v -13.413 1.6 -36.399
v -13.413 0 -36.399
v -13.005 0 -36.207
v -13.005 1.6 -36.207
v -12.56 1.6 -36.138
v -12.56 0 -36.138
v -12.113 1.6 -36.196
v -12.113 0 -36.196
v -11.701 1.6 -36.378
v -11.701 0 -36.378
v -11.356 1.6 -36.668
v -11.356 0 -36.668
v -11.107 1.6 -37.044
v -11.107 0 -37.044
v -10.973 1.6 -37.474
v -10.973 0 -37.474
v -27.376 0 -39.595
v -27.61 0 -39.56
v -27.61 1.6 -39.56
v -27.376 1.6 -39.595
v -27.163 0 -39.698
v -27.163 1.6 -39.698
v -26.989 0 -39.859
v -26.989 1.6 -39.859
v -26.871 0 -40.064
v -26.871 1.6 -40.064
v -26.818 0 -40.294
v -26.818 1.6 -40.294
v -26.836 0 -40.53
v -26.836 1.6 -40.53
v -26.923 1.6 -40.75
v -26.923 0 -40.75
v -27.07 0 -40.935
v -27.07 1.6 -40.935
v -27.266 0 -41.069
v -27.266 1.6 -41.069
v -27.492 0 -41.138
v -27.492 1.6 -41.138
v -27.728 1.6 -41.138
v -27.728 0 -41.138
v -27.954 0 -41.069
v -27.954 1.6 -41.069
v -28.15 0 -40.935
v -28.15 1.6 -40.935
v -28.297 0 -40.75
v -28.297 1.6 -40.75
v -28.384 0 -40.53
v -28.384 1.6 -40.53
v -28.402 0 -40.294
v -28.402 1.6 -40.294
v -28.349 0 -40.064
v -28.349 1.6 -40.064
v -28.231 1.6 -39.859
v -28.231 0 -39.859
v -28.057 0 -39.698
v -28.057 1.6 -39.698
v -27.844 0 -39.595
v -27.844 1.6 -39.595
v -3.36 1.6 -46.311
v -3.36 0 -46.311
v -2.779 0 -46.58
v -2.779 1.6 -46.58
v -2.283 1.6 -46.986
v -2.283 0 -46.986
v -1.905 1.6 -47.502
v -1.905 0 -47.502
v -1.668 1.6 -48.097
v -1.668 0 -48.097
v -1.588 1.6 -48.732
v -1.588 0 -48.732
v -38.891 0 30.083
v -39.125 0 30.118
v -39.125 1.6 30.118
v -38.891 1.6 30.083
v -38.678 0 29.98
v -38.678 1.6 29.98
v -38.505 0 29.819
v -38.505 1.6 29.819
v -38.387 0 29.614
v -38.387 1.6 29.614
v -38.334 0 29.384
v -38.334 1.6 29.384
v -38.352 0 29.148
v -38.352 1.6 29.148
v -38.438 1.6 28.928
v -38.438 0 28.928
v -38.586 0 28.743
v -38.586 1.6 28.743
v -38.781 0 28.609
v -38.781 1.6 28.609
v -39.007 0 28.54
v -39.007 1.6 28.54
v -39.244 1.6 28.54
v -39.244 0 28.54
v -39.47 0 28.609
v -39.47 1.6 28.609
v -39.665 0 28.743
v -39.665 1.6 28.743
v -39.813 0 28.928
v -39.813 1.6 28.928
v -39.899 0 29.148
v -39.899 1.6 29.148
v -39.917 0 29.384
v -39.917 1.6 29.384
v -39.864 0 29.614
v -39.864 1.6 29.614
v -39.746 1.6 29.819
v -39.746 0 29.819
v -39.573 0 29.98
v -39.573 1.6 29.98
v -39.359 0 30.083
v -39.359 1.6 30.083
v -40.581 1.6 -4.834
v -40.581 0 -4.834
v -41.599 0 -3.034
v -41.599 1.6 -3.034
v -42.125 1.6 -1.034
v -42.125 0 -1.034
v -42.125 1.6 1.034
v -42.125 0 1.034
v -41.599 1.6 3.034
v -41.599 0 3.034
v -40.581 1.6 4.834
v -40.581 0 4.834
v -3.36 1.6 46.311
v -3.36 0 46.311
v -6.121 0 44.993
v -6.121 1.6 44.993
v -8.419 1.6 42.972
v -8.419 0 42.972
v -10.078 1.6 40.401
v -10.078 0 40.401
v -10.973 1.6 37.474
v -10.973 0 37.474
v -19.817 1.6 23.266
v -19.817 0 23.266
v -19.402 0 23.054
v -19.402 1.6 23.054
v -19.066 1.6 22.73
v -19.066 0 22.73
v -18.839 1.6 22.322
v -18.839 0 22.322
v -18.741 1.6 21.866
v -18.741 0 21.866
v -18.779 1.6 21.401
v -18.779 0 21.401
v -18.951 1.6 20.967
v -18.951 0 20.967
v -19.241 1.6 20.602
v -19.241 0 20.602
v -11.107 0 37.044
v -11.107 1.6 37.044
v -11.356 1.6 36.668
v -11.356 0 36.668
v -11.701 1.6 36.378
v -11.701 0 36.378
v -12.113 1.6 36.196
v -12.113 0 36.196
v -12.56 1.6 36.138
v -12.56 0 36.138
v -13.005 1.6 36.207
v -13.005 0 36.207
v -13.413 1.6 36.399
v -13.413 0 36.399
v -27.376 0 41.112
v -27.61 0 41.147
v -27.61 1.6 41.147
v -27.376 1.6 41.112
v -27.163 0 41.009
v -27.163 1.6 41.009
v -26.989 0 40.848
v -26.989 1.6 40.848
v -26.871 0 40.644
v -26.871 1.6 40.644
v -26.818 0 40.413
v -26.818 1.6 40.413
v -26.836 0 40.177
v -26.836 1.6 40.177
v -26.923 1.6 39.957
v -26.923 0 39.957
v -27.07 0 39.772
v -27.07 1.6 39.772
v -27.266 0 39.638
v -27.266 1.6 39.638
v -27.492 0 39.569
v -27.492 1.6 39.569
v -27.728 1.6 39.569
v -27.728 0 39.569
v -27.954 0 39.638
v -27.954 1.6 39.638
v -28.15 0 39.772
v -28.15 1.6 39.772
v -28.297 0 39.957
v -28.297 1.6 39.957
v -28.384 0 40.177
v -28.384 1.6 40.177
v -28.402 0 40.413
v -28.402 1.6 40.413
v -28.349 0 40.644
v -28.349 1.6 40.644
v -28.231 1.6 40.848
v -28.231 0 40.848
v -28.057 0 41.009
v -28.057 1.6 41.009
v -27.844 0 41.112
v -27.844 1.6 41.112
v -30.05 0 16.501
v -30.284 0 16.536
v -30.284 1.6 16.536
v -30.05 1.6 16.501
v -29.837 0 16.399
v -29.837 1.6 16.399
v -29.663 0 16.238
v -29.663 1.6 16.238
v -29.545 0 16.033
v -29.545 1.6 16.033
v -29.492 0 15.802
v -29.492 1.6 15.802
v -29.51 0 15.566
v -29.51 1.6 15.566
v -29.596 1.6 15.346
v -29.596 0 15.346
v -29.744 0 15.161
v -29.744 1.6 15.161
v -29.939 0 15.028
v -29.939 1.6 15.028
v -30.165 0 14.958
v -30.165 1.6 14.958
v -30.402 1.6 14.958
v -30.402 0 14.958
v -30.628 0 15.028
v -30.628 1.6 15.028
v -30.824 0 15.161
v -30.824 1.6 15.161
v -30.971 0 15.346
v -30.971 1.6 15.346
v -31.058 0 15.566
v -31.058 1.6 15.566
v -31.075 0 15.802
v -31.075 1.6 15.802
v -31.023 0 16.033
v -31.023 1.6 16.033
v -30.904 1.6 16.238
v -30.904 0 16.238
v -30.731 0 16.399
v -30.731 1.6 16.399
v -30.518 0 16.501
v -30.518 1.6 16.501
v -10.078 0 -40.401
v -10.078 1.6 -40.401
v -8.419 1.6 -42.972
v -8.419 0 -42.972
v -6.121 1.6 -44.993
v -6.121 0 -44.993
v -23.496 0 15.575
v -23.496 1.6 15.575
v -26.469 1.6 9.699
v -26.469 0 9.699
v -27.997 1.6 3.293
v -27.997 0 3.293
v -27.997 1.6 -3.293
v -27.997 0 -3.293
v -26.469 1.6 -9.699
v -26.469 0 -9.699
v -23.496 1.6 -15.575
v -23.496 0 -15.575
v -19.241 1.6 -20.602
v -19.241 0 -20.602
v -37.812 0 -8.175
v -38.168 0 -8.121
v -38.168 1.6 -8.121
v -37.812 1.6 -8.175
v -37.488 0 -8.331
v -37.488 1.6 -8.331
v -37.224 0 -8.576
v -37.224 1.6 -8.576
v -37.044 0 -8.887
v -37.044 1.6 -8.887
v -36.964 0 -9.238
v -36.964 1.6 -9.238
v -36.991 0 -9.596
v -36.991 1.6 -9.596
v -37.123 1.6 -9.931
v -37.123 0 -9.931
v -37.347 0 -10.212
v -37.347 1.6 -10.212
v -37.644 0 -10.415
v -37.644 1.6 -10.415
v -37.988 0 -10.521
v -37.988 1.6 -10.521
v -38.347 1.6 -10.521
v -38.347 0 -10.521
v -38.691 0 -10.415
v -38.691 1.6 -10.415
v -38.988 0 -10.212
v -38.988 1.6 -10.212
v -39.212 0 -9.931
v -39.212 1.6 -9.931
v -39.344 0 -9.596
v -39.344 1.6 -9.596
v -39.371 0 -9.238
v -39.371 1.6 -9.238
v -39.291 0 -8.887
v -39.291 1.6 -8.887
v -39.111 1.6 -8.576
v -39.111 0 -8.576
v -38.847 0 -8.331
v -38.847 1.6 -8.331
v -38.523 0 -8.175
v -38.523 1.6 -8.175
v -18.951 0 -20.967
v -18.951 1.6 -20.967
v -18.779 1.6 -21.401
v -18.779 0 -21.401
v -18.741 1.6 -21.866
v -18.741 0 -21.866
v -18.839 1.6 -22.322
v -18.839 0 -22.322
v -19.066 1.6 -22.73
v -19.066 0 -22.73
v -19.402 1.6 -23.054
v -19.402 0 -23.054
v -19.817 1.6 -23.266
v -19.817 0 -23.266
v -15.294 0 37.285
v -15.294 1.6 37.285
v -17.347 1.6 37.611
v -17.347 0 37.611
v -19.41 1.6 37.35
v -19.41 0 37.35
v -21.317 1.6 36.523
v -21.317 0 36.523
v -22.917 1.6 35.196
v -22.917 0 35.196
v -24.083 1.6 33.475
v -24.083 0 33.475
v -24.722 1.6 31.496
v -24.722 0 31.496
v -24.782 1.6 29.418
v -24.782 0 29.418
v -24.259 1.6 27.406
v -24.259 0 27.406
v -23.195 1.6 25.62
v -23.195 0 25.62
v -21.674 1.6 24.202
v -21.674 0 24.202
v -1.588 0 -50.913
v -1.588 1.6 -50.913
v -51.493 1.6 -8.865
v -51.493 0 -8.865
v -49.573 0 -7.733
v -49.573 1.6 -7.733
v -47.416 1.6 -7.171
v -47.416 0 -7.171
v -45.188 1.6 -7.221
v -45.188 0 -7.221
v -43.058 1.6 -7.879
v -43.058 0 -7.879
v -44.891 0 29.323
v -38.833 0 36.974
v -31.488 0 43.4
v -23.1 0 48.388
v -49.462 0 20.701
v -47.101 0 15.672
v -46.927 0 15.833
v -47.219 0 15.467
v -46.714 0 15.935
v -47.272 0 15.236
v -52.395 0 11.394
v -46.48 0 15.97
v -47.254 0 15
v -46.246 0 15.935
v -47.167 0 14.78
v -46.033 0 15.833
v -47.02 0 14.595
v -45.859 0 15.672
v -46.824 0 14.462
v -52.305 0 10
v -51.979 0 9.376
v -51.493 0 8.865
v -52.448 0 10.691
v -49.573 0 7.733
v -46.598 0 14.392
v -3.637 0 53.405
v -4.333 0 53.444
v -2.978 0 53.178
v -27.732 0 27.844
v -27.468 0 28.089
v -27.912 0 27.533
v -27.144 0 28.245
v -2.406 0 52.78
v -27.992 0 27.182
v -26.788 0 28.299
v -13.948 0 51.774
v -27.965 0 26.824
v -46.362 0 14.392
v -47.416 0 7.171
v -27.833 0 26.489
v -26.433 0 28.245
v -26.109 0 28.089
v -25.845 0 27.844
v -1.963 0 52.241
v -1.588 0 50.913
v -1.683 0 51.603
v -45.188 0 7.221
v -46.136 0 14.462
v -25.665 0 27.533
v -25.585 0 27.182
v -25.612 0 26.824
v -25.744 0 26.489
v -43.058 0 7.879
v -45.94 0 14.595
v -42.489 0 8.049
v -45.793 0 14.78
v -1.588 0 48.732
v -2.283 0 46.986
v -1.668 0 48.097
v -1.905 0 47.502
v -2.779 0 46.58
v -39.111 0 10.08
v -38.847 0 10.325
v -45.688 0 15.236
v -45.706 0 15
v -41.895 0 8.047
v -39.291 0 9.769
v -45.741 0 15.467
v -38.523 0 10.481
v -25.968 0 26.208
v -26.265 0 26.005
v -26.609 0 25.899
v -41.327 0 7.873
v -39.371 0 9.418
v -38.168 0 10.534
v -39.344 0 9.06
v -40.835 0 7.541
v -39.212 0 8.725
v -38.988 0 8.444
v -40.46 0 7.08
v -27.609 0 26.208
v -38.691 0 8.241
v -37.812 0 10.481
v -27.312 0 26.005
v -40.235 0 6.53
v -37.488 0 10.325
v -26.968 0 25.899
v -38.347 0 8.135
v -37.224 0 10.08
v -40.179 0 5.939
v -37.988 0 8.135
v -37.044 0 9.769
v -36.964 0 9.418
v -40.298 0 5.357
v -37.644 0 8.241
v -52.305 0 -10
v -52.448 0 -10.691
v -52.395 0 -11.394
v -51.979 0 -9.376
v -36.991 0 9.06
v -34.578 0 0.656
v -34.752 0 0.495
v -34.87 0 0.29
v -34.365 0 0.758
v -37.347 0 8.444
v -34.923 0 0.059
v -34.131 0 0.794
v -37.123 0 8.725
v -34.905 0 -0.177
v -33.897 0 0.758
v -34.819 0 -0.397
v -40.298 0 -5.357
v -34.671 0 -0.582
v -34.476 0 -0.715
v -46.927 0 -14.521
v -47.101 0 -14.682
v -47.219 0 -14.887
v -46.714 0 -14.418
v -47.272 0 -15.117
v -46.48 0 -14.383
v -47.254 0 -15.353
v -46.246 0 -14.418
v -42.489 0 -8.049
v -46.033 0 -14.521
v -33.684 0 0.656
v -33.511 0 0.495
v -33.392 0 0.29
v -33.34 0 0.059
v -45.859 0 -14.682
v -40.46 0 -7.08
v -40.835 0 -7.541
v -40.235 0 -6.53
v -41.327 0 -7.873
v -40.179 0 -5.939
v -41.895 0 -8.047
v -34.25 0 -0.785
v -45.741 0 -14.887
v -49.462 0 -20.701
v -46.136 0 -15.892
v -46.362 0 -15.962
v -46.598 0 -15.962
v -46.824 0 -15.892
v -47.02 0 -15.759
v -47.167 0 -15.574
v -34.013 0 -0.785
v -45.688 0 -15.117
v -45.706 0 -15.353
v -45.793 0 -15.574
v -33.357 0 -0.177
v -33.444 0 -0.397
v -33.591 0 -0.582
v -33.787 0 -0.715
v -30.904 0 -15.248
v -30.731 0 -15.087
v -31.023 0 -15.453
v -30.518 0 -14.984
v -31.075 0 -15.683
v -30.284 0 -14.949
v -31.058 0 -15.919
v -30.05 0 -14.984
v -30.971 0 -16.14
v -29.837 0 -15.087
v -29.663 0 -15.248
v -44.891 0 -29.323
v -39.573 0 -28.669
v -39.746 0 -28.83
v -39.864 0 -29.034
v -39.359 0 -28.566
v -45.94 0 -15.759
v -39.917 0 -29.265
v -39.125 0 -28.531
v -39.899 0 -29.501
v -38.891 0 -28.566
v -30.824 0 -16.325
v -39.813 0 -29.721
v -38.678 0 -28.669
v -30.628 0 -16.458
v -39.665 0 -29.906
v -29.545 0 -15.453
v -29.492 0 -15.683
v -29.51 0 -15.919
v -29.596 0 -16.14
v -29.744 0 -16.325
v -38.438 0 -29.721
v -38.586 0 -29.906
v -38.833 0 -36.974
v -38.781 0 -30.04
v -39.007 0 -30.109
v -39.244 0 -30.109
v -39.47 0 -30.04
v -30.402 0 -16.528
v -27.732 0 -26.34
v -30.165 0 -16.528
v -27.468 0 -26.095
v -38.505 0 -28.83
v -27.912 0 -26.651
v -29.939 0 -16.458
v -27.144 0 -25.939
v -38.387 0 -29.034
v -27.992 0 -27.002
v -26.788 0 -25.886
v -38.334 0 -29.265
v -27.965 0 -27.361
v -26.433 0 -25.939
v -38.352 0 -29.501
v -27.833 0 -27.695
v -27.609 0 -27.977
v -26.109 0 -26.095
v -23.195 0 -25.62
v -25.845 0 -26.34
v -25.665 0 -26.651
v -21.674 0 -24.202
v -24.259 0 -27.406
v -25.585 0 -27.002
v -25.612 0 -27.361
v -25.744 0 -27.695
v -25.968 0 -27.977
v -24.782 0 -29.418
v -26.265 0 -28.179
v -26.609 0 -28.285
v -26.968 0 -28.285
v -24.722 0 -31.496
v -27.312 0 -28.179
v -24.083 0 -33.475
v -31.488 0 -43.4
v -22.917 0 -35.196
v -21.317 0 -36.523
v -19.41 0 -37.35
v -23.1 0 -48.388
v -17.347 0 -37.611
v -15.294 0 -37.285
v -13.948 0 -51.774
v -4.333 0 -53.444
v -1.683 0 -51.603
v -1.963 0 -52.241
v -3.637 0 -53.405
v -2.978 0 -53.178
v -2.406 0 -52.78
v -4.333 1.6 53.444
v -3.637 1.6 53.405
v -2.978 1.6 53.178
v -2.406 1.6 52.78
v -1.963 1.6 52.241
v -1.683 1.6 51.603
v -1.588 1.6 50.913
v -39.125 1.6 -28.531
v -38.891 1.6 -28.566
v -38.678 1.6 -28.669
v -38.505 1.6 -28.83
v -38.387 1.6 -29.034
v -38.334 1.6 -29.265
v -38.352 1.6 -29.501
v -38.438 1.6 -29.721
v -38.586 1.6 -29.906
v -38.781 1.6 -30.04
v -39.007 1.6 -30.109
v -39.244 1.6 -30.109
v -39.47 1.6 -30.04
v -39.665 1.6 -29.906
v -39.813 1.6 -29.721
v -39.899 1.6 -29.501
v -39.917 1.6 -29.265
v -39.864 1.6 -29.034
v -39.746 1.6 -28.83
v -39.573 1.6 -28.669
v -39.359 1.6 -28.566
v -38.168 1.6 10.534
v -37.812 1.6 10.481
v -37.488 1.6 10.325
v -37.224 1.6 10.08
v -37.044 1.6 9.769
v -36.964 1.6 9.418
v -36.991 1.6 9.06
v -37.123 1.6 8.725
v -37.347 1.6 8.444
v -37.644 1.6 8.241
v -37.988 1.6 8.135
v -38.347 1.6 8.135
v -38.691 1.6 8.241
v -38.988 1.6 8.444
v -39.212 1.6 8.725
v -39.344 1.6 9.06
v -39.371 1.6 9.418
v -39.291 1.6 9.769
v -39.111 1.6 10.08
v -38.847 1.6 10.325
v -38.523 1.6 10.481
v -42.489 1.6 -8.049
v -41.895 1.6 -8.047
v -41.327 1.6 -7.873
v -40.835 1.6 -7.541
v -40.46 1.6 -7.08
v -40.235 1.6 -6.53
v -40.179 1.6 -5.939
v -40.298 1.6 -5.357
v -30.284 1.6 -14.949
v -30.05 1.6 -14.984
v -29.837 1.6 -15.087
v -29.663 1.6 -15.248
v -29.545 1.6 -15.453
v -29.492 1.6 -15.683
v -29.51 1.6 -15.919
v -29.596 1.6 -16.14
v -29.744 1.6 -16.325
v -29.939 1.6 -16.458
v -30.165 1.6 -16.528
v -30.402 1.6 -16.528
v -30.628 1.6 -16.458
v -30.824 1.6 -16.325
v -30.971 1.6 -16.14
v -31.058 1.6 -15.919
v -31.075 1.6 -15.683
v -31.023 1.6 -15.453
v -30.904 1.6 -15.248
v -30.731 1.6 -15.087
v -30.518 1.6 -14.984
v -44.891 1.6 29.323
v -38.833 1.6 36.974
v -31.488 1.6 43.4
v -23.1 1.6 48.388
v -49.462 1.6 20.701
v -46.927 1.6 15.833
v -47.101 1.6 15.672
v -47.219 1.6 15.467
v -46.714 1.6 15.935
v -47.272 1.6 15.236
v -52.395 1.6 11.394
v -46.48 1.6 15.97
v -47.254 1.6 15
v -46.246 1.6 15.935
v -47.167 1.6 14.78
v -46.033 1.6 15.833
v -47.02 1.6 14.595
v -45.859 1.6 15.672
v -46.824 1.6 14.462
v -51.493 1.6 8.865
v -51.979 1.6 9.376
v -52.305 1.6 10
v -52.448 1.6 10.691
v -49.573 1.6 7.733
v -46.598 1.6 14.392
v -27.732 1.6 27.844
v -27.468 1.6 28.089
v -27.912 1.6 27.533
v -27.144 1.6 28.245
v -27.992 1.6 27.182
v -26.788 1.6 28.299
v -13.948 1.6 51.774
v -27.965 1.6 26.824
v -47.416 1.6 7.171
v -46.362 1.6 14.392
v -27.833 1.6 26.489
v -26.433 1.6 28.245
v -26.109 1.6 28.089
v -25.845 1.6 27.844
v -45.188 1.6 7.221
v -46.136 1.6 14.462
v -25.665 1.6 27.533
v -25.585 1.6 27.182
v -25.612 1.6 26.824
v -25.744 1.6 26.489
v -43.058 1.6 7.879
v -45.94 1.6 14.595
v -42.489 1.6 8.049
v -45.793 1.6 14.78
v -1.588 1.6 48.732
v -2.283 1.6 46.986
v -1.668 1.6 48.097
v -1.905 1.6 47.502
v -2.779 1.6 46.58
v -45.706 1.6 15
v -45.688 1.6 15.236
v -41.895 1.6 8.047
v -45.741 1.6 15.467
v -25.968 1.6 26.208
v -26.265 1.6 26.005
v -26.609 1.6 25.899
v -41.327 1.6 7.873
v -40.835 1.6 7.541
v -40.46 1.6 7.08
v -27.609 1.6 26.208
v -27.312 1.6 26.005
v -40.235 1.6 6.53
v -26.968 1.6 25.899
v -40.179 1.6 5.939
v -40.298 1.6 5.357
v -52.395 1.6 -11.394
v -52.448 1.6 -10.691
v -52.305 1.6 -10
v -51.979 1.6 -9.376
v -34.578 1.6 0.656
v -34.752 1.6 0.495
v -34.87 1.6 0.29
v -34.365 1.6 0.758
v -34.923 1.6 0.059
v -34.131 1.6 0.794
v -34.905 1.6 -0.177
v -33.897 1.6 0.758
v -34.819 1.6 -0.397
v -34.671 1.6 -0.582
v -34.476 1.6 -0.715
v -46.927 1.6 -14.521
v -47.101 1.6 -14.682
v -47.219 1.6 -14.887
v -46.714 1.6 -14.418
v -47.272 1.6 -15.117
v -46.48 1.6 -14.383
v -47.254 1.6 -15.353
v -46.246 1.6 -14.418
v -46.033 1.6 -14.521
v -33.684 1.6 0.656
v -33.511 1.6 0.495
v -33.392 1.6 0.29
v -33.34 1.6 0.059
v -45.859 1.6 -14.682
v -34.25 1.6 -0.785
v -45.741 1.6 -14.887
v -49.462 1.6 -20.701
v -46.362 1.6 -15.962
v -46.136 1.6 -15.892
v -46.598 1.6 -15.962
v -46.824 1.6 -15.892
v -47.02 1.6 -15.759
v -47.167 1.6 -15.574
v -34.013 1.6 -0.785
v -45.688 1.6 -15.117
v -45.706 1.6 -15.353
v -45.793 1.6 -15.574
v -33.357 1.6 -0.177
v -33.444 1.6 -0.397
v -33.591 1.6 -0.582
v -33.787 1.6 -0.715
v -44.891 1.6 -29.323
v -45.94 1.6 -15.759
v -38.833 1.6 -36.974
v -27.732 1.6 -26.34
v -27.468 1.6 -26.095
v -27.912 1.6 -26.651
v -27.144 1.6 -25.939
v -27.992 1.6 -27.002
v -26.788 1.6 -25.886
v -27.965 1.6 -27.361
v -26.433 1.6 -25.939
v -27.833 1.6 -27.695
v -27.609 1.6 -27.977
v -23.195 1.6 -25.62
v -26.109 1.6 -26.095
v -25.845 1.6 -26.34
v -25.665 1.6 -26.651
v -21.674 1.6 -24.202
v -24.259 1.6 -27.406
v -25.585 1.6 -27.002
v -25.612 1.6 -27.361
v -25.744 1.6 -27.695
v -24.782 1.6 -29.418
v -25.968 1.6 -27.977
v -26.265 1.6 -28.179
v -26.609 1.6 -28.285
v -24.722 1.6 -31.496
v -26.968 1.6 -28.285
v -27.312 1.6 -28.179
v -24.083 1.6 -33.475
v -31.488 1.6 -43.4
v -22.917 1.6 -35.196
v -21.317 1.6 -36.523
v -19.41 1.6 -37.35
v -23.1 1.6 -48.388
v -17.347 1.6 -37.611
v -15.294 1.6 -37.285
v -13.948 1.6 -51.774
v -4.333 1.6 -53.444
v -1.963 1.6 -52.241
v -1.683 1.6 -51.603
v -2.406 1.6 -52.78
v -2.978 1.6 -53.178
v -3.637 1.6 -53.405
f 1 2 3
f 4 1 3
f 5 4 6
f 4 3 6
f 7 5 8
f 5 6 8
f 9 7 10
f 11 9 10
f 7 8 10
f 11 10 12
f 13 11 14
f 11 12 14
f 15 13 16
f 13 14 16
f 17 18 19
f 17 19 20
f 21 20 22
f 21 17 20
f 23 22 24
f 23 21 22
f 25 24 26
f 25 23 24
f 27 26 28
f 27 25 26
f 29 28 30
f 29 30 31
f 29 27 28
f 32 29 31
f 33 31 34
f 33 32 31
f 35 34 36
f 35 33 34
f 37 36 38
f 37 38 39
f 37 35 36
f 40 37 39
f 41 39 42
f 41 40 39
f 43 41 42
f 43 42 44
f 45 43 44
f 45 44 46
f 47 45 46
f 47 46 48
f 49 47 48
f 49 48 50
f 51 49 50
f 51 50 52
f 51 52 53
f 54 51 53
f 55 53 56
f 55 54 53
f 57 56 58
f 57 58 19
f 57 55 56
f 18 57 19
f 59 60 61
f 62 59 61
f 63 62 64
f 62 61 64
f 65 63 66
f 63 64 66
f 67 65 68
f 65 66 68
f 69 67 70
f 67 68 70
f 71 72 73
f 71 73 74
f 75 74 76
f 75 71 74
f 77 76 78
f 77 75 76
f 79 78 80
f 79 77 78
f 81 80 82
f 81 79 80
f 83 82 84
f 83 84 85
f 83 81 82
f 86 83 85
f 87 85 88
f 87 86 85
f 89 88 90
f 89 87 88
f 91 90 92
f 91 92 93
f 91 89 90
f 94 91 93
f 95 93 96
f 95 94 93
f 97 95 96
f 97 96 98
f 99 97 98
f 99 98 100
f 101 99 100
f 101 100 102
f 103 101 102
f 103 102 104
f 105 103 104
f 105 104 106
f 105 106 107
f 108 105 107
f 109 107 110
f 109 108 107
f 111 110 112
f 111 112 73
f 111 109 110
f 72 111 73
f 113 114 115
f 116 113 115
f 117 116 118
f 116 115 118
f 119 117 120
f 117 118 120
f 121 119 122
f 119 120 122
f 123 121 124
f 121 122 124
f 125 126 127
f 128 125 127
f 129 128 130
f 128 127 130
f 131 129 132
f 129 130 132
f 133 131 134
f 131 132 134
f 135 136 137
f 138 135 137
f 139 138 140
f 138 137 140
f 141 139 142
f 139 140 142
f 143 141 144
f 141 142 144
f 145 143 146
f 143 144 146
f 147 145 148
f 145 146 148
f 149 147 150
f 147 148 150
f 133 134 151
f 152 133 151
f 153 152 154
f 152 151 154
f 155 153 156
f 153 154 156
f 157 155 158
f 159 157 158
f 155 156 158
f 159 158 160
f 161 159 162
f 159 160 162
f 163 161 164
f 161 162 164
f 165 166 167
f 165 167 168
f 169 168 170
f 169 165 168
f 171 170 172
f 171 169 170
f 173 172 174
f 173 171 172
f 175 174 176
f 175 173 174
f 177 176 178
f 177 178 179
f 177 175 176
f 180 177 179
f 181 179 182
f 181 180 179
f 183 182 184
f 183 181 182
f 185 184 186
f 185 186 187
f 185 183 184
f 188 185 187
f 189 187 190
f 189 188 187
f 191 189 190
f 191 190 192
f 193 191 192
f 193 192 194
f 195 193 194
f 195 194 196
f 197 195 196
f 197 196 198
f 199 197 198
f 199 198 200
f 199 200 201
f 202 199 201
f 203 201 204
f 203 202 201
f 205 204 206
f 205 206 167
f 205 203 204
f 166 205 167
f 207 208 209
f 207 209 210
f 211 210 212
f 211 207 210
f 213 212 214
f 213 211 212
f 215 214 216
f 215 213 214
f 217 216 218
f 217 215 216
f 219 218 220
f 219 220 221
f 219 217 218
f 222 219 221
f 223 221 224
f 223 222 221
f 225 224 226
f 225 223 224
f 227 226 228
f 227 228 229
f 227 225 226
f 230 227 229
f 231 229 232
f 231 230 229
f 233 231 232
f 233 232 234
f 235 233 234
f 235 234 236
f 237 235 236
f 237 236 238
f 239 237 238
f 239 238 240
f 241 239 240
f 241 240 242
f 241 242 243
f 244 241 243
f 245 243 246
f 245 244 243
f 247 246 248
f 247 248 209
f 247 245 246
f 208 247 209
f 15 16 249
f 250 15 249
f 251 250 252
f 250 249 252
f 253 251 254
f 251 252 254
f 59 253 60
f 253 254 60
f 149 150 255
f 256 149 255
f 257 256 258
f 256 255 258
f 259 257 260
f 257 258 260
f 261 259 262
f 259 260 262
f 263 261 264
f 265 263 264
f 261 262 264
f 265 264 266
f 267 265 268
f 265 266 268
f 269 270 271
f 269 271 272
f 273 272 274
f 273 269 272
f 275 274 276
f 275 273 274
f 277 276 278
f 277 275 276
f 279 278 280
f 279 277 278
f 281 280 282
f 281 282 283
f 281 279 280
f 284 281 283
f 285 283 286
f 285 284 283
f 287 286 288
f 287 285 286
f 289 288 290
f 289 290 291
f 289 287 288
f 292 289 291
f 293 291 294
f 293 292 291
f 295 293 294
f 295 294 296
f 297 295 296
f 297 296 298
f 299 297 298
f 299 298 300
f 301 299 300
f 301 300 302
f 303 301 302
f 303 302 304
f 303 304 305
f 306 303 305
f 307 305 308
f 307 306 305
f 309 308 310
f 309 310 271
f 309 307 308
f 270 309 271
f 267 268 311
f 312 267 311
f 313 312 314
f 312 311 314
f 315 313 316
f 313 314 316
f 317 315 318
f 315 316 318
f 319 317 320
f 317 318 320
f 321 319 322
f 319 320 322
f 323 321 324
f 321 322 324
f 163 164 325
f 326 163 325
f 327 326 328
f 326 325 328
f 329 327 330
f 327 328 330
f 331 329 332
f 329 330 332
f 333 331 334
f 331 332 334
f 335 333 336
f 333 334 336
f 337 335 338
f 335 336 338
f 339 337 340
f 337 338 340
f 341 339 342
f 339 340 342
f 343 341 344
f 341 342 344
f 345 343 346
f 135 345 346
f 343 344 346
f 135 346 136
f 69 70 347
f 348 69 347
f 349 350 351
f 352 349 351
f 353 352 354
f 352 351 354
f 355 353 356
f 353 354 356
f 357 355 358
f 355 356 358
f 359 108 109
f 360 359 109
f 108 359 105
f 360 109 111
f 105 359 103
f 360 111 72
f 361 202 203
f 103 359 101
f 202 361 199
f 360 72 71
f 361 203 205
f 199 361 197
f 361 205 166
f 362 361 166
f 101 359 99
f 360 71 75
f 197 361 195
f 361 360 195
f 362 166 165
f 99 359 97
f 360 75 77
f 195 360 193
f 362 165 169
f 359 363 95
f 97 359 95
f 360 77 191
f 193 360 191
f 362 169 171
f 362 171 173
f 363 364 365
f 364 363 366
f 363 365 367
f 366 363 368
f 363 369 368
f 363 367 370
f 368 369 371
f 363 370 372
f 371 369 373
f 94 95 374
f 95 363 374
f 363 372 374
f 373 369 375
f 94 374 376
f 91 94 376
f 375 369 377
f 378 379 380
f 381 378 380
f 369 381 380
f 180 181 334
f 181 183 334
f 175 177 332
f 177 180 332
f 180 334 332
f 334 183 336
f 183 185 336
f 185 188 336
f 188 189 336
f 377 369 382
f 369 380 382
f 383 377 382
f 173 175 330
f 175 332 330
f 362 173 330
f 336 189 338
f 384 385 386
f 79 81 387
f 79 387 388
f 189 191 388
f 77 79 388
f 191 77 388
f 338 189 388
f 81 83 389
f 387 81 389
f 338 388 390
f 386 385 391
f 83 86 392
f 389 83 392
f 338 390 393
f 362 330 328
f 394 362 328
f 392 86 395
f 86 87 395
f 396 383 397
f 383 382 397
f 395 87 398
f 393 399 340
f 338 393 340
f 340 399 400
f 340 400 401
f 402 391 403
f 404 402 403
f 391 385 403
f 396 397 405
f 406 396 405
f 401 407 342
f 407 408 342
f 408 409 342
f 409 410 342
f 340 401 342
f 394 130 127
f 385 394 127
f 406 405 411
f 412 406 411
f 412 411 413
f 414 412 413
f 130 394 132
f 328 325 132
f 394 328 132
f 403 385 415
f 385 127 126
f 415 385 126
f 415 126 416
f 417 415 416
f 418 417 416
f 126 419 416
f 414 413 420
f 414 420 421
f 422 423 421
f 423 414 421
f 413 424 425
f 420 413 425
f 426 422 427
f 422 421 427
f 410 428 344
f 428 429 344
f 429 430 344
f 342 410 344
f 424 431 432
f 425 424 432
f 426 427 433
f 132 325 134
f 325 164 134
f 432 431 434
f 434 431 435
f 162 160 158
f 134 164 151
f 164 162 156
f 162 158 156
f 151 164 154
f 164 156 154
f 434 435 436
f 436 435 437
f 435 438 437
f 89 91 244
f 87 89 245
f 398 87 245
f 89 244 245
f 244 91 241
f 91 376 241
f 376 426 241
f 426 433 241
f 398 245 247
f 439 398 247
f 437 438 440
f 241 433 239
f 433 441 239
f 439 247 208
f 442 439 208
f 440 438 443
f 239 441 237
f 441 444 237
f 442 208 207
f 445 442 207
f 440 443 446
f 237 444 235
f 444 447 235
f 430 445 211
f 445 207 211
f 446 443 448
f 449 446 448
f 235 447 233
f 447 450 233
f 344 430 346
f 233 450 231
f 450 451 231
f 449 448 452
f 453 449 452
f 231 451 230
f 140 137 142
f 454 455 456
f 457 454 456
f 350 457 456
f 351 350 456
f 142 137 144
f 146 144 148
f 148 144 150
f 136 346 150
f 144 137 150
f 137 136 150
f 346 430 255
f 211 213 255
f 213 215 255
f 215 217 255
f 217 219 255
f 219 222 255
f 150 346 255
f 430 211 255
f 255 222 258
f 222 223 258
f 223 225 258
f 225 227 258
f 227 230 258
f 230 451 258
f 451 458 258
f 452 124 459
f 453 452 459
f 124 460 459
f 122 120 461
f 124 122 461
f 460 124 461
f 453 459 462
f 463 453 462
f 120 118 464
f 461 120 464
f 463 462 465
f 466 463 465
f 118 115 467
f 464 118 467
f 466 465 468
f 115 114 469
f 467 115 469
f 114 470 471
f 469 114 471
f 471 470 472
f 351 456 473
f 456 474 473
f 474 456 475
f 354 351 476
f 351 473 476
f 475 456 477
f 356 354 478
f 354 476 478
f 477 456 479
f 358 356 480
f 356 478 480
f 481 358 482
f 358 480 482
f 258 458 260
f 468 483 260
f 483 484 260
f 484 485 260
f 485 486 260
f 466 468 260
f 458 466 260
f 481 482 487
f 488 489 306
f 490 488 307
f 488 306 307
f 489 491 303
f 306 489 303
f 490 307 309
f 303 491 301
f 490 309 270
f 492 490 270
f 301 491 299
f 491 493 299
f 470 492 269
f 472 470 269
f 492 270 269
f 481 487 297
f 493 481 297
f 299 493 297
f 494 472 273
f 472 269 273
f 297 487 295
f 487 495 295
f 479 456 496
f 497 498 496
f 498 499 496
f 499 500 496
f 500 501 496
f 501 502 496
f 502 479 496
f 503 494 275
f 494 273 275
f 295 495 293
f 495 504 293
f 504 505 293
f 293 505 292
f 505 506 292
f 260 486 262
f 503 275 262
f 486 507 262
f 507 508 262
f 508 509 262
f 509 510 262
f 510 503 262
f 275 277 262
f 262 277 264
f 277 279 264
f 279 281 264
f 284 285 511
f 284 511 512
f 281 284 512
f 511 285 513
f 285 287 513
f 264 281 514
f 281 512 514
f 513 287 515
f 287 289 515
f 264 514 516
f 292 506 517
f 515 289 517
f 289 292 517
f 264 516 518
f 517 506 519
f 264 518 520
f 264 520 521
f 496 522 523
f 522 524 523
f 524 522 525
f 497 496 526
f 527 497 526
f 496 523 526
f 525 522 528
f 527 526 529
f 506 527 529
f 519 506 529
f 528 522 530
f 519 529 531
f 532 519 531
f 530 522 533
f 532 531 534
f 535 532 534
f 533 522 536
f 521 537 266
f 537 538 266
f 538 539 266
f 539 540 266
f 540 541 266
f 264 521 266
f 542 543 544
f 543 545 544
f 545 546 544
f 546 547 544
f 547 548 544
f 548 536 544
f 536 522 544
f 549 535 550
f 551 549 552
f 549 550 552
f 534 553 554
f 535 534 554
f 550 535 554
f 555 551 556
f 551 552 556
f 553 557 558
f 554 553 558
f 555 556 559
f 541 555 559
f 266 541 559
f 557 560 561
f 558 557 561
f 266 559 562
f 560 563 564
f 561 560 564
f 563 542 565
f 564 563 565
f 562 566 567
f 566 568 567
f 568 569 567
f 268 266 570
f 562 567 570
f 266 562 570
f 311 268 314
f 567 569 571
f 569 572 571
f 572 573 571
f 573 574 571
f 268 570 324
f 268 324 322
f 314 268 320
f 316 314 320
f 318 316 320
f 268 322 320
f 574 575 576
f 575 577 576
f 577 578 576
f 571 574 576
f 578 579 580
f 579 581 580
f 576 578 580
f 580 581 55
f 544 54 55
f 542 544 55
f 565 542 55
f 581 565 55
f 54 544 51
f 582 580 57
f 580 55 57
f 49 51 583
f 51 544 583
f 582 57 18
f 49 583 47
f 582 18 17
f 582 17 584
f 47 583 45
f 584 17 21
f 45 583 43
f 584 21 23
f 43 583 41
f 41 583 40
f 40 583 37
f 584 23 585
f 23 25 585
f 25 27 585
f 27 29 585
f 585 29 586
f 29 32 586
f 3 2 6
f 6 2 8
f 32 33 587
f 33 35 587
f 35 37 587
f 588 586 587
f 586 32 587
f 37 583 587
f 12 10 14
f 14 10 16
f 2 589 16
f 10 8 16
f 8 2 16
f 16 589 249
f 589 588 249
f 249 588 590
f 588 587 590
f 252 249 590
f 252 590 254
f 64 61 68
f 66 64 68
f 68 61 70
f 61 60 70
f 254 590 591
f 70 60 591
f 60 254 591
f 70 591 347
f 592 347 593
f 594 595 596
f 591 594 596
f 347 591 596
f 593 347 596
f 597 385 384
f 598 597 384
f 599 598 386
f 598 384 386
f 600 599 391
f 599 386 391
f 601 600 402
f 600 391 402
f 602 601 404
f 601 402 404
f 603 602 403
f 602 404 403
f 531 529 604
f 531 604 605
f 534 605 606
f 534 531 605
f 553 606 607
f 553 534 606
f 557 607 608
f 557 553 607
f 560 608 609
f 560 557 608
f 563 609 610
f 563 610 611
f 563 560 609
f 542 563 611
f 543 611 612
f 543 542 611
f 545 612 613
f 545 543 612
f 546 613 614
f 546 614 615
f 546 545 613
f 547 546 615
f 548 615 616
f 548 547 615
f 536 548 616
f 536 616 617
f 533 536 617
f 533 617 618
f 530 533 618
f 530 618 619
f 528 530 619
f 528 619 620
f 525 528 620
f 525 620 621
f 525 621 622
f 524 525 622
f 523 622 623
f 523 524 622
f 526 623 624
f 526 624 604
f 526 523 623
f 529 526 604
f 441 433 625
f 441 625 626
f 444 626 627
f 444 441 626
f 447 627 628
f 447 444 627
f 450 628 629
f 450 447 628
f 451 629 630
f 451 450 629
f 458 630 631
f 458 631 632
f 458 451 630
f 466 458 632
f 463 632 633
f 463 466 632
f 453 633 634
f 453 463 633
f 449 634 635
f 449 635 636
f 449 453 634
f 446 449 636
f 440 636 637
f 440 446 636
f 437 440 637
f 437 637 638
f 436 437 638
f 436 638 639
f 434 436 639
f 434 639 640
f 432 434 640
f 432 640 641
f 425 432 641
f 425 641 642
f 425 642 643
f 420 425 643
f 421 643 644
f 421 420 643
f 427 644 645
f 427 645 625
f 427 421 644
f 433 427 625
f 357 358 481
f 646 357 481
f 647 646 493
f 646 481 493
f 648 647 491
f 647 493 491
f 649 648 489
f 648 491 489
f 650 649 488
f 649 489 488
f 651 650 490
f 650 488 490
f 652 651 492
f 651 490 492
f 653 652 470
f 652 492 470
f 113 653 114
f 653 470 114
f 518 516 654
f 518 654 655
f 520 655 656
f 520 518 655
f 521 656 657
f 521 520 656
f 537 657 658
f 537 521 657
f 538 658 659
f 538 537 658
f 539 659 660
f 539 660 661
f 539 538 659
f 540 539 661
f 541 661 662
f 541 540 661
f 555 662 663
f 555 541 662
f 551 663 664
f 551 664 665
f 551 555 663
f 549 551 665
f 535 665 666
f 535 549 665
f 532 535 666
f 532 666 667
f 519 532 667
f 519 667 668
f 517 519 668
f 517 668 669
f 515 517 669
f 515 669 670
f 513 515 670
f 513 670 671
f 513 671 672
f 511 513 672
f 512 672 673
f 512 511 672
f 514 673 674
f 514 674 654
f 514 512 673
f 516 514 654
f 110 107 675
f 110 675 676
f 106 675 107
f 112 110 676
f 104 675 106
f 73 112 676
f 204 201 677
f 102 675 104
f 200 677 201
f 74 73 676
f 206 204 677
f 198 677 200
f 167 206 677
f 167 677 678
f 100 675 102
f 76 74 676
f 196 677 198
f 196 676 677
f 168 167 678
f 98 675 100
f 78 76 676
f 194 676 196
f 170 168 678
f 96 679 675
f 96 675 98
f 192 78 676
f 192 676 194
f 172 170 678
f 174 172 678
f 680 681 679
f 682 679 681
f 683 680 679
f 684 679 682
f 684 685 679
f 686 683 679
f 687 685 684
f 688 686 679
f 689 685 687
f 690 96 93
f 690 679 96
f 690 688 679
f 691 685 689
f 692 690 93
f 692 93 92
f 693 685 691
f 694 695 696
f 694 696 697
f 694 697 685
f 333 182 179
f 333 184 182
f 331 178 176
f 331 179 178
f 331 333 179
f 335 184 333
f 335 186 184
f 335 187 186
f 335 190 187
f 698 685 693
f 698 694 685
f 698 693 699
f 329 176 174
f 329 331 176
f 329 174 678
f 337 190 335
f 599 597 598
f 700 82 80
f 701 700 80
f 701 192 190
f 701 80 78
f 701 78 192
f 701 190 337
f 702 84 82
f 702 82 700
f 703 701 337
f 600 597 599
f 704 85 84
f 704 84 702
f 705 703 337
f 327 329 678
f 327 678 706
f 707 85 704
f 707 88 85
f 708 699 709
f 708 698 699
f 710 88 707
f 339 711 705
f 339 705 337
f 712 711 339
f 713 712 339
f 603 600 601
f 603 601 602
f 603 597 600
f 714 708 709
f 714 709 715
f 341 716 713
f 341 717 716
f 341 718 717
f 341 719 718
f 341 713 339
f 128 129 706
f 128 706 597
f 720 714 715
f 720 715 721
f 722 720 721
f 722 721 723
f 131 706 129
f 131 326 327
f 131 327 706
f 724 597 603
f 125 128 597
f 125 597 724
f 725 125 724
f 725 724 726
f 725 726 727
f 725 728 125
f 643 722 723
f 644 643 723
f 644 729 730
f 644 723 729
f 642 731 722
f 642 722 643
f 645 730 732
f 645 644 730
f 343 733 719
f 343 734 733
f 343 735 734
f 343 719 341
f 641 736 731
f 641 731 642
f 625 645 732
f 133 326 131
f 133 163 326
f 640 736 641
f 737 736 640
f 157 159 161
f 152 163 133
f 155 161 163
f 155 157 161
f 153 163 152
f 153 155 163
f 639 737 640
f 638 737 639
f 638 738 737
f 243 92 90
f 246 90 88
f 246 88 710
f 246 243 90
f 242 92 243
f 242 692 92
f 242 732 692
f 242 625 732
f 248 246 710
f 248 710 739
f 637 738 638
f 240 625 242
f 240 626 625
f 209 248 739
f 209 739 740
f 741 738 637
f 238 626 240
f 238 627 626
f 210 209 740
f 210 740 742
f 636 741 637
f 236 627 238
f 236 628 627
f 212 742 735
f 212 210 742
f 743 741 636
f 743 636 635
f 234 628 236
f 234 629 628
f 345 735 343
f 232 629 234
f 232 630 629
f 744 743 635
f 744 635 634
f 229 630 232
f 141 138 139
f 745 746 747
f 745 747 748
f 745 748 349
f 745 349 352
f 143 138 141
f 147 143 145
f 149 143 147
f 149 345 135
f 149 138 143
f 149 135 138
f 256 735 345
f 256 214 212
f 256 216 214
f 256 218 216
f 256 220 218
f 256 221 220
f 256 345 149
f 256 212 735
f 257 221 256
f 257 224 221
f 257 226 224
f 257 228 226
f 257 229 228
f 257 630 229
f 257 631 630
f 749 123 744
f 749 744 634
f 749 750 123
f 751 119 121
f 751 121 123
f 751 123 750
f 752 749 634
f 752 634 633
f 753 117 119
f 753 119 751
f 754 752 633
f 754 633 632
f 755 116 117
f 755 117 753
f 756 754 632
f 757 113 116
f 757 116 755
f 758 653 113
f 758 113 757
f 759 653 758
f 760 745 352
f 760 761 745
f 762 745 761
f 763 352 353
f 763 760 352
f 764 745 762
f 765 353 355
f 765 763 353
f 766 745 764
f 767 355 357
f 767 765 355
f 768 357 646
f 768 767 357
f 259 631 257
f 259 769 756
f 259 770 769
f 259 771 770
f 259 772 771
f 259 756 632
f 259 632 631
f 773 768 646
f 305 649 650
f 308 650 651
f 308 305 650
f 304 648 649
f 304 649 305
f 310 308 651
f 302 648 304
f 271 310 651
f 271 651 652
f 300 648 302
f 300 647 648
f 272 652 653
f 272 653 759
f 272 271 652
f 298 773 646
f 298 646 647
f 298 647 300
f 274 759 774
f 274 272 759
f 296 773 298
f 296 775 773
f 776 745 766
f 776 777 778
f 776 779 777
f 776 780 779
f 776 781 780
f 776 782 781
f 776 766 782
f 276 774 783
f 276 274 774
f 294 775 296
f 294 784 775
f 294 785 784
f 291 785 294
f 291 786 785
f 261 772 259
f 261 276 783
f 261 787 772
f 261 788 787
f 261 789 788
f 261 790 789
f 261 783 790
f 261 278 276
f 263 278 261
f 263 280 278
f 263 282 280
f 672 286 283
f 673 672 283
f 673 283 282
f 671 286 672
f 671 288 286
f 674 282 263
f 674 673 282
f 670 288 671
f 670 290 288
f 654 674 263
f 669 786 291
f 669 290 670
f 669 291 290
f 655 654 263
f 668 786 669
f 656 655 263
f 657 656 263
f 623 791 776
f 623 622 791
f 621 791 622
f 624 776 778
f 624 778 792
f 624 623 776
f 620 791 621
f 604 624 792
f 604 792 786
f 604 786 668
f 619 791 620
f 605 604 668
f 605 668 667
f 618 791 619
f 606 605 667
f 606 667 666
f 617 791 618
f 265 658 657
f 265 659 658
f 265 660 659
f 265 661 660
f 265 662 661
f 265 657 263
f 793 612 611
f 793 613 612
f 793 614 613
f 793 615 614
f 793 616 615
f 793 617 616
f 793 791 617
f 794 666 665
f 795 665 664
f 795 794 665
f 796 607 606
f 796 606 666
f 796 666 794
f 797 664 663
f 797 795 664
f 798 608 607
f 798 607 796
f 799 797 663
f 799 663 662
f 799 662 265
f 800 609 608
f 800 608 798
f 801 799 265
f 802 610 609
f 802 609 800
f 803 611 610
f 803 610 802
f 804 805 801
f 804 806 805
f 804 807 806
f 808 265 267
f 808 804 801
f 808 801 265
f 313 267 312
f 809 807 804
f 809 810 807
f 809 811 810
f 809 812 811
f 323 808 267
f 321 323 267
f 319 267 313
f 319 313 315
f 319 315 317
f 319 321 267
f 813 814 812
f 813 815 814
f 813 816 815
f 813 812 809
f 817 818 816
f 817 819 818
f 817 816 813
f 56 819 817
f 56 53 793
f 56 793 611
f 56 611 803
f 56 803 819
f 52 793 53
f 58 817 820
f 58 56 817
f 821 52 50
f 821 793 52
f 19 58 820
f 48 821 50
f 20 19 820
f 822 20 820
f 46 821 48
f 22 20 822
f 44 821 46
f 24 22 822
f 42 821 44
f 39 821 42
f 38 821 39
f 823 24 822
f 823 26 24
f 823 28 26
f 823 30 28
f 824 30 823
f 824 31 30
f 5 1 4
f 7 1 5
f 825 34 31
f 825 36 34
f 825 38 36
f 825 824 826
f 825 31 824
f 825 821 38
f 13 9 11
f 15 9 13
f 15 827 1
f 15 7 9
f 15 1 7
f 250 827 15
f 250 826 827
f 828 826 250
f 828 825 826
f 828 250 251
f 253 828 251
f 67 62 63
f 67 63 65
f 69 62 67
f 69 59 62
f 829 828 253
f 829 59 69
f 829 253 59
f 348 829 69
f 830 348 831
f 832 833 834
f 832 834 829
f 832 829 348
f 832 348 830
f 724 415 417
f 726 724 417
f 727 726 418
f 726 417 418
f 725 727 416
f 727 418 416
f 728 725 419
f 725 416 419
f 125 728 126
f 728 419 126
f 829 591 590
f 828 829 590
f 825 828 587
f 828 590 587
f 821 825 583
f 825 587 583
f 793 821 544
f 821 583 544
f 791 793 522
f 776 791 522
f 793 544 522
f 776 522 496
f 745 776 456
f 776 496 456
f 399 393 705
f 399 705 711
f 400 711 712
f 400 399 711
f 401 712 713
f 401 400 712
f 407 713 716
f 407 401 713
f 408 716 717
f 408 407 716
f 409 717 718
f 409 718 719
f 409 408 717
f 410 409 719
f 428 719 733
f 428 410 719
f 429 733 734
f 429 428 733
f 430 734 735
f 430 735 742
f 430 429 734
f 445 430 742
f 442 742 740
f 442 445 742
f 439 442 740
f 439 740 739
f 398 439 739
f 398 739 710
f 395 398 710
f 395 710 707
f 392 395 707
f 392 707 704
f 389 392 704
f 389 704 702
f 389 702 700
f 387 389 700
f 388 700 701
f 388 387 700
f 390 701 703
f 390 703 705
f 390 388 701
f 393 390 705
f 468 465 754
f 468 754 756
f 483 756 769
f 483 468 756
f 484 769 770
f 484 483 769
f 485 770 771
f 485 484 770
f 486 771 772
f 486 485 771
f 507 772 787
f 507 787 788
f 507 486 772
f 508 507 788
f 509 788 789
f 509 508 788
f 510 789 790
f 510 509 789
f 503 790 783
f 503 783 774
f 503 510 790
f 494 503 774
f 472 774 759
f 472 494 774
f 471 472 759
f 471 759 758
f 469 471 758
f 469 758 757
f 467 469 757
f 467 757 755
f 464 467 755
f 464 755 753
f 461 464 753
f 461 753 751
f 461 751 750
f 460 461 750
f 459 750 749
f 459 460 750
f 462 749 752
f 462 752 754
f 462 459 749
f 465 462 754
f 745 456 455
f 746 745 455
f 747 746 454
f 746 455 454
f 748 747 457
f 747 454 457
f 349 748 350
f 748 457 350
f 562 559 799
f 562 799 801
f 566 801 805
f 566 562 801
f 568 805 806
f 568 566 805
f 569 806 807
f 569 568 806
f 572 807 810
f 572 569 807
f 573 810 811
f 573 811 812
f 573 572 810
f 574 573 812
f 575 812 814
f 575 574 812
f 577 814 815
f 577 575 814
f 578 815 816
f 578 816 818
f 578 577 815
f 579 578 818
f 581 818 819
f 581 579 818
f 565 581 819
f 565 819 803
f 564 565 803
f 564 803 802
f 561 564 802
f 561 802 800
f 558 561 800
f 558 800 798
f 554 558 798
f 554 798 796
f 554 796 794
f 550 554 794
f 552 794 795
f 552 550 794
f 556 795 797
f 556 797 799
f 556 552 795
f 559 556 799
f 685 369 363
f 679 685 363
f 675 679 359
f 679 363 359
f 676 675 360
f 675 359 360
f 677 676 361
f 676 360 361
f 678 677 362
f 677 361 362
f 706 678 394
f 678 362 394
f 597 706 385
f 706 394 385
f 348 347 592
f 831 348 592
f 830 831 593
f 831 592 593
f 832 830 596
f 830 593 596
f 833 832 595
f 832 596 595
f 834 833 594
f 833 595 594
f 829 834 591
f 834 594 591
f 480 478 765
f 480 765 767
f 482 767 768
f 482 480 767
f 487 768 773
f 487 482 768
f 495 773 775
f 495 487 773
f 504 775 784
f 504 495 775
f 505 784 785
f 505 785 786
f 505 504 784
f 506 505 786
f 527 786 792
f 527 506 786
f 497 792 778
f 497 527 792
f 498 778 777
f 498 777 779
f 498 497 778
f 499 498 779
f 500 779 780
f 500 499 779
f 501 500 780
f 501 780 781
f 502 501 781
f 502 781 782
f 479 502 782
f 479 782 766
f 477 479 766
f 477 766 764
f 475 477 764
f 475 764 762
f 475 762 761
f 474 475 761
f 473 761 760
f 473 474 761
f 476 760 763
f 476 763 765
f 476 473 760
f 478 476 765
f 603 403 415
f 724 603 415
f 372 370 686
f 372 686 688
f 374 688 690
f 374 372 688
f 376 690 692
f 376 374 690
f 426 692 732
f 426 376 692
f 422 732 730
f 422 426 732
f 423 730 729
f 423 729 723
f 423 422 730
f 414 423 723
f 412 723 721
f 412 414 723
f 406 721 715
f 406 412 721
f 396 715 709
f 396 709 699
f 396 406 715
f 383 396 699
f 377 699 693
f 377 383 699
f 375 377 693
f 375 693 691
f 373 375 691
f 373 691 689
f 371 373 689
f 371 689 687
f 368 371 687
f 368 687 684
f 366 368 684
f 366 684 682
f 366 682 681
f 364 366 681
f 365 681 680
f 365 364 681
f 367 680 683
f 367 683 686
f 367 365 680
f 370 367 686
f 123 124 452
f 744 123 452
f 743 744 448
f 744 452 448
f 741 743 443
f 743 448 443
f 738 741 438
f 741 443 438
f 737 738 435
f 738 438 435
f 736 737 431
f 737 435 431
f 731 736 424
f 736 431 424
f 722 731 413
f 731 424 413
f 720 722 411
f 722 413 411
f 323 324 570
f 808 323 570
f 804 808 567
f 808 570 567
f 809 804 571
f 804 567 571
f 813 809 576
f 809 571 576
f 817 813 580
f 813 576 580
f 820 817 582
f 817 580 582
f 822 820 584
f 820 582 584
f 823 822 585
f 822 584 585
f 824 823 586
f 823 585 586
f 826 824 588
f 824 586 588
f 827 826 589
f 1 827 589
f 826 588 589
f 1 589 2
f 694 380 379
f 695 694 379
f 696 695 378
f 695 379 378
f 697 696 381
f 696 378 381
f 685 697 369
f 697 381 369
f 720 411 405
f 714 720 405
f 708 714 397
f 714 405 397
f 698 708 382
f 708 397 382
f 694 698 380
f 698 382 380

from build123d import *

# Parameters (mm, degrees)
SKETCH2_R           = 0.79375
SKETCH2_R_2         = 1.2065
BOSS_EXTRUDE1_DEPTH = 1.6


with BuildPart() as part:
    # Sketch2 → Boss-Extrude1 (new body)
    with BuildSketch(Plane(origin=(0, 0, 0), x_dir=(1, 0, 0), z_dir=(0, 1, 0))):
        with BuildLine():
            Line((-1.5875, 48.732377473), (-1.5875, 50.912554448))
            ThreePointArc((-1.5875, 50.912554448), (-2.405542288, 52.779761356), (-4.332745385, 53.444248412))
            ThreePointArc((-4.332745385, 53.444248412), (-35.306836043, 40.354525144), (-52.395068561, 11.393733429))
            ThreePointArc((-52.395068561, 11.393733429), (-52.305343014, 10.000391507), (-51.492756078, 8.864981951))
            ThreePointArc((-51.492756078, 8.864981951), (-47.415865481, 7.171089887), (-43.058200955, 7.878950847))
            ThreePointArc((-43.058200955, 7.878950847), (-40.630358405, 7.324125051), (-40.580789574, 4.834186489))
            ThreePointArc((-40.580789574, 4.834186489), (-42.191393903, 0), (-40.580789574, -4.834186489))
            ThreePointArc((-40.580789574, -4.834186489), (-40.630358405, -7.324125051), (-43.058200955, -7.878950847))
            ThreePointArc((-43.058200955, -7.878950847), (-47.415865481, -7.171089887), (-51.492756078, -8.864981951))
            ThreePointArc((-51.492756078, -8.864981951), (-52.305343014, -10.000391507), (-52.395068561, -11.393733429))
            ThreePointArc((-52.395068561, -11.393733429), (-35.306836043, -40.354525144), (-4.332745385, -53.444248412))
            ThreePointArc((-4.332745385, -53.444248412), (-2.405542288, -52.779761356), (-1.5875, -50.912554448))
            Line((-1.5875, -50.912554448), (-1.5875, -48.732377473))
            ThreePointArc((-1.5875, -48.732377473), (-2.077855675, -47.232191438), (-3.359593023, -46.311237478))
            ThreePointArc((-3.359593023, -46.311237478), (-8.418901259, -42.972008429), (-10.972940557, -37.474378601))
            ThreePointArc((-10.972940557, -37.474378601), (-11.900363007, -36.272469223), (-13.41319791, -36.399075336))
            ThreePointArc((-13.41319791, -36.399075336), (-24.083249547, -33.474502145), (-19.817234122, -23.266454208))
            ThreePointArc((-19.817234122, -23.266454208), (-18.773073396, -22.097738961), (-19.241161334, -20.602058302))
            ThreePointArc((-19.241161334, -20.602058302), (-28.189840294, 0), (-19.241161334, 20.602058302))
            ThreePointArc((-19.241161334, 20.602058302), (-18.773073396, 22.097738961), (-19.817234122, 23.266454208))
            ThreePointArc((-19.817234122, 23.266454208), (-24.083249547, 33.474502145), (-13.41319791, 36.399075336))
            ThreePointArc((-13.41319791, 36.399075336), (-11.900363007, 36.272469223), (-10.972940557, 37.474378601))
            ThreePointArc((-10.972940557, 37.474378601), (-8.418901259, 42.972008429), (-3.359593023, 46.311237478))
            ThreePointArc((-3.359593023, 46.311237478), (-2.077855675, 47.232191438), (-1.5875, 48.732377473))
        make_face()
        with Locations(Location((-39.125436229, 29.324414144, 0), (0, 0, 270))):
            Circle(SKETCH2_R, mode=Mode.SUBTRACT)
        with Locations(Location((-30.283799979, -15.742734369, 0), (0, 0, 270))):
            Circle(SKETCH2_R, mode=Mode.SUBTRACT)
        with Locations(Location((-46.479977899, -15.176715045, 0), (0, 0, 270))):
            Circle(SKETCH2_R, mode=Mode.SUBTRACT)
        with Locations(Location((-34.13125, 0, 0), (0, 0, 270))):
            Circle(SKETCH2_R, mode=Mode.SUBTRACT)
        with Locations(Location((-46.479977899, 15.176715045, 0), (0, 0, 270))):
            Circle(SKETCH2_R, mode=Mode.SUBTRACT)
        with Locations(Location((-30.283799979, 15.742734369, 0), (0, 0, 270))):
            Circle(SKETCH2_R, mode=Mode.SUBTRACT)
        with Locations(Location((-38.167598541, -9.327981047, 0), (0, 0, 270))):
            Circle(SKETCH2_R_2, mode=Mode.SUBTRACT)
        with Locations(Location((-38.167598541, 9.327981047, 0), (0, 0, 270))):
            Circle(SKETCH2_R_2, mode=Mode.SUBTRACT)
        with Locations(Location((-26.788483085, 27.092197659, 0), (0, 0, 270))):
            Circle(SKETCH2_R_2, mode=Mode.SUBTRACT)
        with Locations(Location((-27.610010923, 40.353541627, 0), (0, 0, 270))):
            Circle(SKETCH2_R, mode=Mode.SUBTRACT)
        with Locations(Location((-39.125436229, -29.324414144, 0), (0, 0, 270))):
            Circle(SKETCH2_R, mode=Mode.SUBTRACT)
        with Locations(Location((-26.788483085, -27.092197659, 0), (0, 0, 270))):
            Circle(SKETCH2_R_2, mode=Mode.SUBTRACT)
        with Locations(Location((-27.610010923, -40.353541627, 0), (0, 0, 270))):
            Circle(SKETCH2_R, mode=Mode.SUBTRACT)
    extrude(amount=BOSS_EXTRUDE1_DEPTH)


solid = part.part
